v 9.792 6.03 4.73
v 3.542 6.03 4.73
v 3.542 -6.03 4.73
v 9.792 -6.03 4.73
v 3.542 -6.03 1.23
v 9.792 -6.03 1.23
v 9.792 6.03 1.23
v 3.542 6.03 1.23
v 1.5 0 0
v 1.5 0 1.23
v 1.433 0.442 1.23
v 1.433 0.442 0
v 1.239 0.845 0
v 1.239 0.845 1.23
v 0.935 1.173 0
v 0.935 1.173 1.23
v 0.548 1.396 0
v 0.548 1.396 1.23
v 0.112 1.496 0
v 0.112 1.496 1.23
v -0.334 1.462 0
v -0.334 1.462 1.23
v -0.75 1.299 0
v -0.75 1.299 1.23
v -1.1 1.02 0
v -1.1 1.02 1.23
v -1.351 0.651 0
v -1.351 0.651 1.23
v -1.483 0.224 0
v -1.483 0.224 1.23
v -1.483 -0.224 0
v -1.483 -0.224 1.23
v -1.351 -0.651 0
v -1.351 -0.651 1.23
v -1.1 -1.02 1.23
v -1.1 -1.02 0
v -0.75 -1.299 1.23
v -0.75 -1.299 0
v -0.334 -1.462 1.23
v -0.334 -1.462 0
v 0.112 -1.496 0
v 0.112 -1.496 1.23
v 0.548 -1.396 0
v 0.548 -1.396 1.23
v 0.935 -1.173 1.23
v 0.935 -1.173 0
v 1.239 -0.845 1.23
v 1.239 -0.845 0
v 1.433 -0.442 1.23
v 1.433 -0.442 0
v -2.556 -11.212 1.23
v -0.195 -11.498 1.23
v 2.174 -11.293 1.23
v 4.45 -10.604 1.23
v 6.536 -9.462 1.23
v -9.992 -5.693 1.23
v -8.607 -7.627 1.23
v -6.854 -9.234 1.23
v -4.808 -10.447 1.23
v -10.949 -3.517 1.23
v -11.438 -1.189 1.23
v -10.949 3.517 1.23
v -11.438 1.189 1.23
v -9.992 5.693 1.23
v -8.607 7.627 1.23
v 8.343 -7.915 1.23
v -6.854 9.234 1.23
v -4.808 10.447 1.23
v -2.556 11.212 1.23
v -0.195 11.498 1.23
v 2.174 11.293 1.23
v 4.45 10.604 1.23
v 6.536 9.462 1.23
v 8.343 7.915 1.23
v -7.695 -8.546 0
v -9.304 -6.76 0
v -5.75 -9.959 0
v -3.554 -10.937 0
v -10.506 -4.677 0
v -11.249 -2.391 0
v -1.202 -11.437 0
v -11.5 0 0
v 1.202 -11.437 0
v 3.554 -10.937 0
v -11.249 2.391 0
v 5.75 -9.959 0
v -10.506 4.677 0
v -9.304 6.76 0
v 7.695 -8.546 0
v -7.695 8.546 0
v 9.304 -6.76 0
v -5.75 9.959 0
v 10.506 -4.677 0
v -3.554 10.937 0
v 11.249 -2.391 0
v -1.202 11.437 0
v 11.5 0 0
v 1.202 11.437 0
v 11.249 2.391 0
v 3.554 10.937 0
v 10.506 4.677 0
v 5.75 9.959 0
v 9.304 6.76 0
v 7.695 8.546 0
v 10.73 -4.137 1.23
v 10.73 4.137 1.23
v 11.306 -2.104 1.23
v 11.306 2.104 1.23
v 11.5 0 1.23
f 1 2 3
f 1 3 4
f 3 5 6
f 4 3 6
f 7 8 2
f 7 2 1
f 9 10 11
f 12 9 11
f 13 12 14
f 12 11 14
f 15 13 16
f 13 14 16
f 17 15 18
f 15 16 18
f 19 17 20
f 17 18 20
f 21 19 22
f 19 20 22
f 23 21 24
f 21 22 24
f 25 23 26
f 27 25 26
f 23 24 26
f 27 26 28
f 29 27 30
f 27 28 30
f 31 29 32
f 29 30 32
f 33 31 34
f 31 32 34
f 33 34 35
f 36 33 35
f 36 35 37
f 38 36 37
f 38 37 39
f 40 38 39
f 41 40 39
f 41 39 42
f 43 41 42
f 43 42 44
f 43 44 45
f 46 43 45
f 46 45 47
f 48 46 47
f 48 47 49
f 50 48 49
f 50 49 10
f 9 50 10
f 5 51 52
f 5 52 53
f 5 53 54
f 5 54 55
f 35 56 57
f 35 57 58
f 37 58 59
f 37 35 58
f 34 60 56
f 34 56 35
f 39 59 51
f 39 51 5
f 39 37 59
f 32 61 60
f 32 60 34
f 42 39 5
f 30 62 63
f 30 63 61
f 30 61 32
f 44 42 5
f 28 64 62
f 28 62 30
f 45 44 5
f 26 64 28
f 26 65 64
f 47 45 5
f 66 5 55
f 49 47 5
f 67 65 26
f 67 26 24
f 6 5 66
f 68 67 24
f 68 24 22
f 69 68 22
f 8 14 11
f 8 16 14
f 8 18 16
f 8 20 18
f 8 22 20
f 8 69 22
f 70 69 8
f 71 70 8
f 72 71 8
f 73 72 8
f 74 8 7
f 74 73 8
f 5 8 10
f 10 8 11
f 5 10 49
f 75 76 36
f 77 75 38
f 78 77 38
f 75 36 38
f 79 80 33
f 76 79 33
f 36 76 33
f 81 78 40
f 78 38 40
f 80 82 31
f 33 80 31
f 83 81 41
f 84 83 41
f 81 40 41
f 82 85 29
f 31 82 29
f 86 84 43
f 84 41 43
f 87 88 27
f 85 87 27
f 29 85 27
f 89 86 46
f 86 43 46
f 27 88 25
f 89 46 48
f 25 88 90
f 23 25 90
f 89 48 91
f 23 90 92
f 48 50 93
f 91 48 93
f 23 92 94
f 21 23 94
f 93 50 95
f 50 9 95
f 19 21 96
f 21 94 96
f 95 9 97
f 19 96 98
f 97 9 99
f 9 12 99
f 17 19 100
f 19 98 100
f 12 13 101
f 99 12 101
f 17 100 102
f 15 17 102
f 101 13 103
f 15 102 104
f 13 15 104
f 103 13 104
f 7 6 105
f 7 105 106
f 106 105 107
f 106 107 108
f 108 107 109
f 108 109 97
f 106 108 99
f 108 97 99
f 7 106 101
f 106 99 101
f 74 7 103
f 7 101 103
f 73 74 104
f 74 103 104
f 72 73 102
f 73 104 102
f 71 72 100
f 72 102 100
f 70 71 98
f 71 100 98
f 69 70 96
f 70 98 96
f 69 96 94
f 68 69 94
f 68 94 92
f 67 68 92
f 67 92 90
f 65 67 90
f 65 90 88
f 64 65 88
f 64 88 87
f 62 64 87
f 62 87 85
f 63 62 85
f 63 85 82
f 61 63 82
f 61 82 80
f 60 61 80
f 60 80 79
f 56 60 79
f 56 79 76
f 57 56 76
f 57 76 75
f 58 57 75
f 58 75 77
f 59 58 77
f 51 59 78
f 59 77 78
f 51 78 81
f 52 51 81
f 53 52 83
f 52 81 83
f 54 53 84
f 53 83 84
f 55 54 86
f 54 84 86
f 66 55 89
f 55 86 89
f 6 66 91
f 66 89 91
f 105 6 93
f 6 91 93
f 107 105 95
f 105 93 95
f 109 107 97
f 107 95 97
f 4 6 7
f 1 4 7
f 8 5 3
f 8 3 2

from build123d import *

# Parameters (mm, degrees)
SKETCH1_R           = 11.5
BOSS_EXTRUDE1_DEPTH = 1.23
SKETCH2_W           = 6.25
SKETCH2_H           = 12.059402844
BOSS_EXTRUDE2_DEPTH = 3.5
SKETCH3_R           = 1.5
CUT_EXTRUDE1_DEPTH  = 17.63580476


with BuildPart() as part:
    # Sketch1 → Boss-Extrude1 (new body)
    with BuildSketch(Plane.XY):
        Circle(SKETCH1_R)
    extrude(amount=BOSS_EXTRUDE1_DEPTH)

    # Sketch2 → Boss-Extrude2 (add)
    with BuildSketch(Plane.XY.offset(1.23)):
        with Locations((6.667481849, 0)):
            Rectangle(SKETCH2_W, SKETCH2_H)
    extrude(amount=BOSS_EXTRUDE2_DEPTH)

    # Sketch3 → Cut-Extrude1 (cut, through all)
    with BuildSketch(Plane.XY.offset(1.23)):
        Circle(SKETCH3_R)
    extrude(amount=-CUT_EXTRUDE1_DEPTH, mode=Mode.SUBTRACT)


solid = part.part
